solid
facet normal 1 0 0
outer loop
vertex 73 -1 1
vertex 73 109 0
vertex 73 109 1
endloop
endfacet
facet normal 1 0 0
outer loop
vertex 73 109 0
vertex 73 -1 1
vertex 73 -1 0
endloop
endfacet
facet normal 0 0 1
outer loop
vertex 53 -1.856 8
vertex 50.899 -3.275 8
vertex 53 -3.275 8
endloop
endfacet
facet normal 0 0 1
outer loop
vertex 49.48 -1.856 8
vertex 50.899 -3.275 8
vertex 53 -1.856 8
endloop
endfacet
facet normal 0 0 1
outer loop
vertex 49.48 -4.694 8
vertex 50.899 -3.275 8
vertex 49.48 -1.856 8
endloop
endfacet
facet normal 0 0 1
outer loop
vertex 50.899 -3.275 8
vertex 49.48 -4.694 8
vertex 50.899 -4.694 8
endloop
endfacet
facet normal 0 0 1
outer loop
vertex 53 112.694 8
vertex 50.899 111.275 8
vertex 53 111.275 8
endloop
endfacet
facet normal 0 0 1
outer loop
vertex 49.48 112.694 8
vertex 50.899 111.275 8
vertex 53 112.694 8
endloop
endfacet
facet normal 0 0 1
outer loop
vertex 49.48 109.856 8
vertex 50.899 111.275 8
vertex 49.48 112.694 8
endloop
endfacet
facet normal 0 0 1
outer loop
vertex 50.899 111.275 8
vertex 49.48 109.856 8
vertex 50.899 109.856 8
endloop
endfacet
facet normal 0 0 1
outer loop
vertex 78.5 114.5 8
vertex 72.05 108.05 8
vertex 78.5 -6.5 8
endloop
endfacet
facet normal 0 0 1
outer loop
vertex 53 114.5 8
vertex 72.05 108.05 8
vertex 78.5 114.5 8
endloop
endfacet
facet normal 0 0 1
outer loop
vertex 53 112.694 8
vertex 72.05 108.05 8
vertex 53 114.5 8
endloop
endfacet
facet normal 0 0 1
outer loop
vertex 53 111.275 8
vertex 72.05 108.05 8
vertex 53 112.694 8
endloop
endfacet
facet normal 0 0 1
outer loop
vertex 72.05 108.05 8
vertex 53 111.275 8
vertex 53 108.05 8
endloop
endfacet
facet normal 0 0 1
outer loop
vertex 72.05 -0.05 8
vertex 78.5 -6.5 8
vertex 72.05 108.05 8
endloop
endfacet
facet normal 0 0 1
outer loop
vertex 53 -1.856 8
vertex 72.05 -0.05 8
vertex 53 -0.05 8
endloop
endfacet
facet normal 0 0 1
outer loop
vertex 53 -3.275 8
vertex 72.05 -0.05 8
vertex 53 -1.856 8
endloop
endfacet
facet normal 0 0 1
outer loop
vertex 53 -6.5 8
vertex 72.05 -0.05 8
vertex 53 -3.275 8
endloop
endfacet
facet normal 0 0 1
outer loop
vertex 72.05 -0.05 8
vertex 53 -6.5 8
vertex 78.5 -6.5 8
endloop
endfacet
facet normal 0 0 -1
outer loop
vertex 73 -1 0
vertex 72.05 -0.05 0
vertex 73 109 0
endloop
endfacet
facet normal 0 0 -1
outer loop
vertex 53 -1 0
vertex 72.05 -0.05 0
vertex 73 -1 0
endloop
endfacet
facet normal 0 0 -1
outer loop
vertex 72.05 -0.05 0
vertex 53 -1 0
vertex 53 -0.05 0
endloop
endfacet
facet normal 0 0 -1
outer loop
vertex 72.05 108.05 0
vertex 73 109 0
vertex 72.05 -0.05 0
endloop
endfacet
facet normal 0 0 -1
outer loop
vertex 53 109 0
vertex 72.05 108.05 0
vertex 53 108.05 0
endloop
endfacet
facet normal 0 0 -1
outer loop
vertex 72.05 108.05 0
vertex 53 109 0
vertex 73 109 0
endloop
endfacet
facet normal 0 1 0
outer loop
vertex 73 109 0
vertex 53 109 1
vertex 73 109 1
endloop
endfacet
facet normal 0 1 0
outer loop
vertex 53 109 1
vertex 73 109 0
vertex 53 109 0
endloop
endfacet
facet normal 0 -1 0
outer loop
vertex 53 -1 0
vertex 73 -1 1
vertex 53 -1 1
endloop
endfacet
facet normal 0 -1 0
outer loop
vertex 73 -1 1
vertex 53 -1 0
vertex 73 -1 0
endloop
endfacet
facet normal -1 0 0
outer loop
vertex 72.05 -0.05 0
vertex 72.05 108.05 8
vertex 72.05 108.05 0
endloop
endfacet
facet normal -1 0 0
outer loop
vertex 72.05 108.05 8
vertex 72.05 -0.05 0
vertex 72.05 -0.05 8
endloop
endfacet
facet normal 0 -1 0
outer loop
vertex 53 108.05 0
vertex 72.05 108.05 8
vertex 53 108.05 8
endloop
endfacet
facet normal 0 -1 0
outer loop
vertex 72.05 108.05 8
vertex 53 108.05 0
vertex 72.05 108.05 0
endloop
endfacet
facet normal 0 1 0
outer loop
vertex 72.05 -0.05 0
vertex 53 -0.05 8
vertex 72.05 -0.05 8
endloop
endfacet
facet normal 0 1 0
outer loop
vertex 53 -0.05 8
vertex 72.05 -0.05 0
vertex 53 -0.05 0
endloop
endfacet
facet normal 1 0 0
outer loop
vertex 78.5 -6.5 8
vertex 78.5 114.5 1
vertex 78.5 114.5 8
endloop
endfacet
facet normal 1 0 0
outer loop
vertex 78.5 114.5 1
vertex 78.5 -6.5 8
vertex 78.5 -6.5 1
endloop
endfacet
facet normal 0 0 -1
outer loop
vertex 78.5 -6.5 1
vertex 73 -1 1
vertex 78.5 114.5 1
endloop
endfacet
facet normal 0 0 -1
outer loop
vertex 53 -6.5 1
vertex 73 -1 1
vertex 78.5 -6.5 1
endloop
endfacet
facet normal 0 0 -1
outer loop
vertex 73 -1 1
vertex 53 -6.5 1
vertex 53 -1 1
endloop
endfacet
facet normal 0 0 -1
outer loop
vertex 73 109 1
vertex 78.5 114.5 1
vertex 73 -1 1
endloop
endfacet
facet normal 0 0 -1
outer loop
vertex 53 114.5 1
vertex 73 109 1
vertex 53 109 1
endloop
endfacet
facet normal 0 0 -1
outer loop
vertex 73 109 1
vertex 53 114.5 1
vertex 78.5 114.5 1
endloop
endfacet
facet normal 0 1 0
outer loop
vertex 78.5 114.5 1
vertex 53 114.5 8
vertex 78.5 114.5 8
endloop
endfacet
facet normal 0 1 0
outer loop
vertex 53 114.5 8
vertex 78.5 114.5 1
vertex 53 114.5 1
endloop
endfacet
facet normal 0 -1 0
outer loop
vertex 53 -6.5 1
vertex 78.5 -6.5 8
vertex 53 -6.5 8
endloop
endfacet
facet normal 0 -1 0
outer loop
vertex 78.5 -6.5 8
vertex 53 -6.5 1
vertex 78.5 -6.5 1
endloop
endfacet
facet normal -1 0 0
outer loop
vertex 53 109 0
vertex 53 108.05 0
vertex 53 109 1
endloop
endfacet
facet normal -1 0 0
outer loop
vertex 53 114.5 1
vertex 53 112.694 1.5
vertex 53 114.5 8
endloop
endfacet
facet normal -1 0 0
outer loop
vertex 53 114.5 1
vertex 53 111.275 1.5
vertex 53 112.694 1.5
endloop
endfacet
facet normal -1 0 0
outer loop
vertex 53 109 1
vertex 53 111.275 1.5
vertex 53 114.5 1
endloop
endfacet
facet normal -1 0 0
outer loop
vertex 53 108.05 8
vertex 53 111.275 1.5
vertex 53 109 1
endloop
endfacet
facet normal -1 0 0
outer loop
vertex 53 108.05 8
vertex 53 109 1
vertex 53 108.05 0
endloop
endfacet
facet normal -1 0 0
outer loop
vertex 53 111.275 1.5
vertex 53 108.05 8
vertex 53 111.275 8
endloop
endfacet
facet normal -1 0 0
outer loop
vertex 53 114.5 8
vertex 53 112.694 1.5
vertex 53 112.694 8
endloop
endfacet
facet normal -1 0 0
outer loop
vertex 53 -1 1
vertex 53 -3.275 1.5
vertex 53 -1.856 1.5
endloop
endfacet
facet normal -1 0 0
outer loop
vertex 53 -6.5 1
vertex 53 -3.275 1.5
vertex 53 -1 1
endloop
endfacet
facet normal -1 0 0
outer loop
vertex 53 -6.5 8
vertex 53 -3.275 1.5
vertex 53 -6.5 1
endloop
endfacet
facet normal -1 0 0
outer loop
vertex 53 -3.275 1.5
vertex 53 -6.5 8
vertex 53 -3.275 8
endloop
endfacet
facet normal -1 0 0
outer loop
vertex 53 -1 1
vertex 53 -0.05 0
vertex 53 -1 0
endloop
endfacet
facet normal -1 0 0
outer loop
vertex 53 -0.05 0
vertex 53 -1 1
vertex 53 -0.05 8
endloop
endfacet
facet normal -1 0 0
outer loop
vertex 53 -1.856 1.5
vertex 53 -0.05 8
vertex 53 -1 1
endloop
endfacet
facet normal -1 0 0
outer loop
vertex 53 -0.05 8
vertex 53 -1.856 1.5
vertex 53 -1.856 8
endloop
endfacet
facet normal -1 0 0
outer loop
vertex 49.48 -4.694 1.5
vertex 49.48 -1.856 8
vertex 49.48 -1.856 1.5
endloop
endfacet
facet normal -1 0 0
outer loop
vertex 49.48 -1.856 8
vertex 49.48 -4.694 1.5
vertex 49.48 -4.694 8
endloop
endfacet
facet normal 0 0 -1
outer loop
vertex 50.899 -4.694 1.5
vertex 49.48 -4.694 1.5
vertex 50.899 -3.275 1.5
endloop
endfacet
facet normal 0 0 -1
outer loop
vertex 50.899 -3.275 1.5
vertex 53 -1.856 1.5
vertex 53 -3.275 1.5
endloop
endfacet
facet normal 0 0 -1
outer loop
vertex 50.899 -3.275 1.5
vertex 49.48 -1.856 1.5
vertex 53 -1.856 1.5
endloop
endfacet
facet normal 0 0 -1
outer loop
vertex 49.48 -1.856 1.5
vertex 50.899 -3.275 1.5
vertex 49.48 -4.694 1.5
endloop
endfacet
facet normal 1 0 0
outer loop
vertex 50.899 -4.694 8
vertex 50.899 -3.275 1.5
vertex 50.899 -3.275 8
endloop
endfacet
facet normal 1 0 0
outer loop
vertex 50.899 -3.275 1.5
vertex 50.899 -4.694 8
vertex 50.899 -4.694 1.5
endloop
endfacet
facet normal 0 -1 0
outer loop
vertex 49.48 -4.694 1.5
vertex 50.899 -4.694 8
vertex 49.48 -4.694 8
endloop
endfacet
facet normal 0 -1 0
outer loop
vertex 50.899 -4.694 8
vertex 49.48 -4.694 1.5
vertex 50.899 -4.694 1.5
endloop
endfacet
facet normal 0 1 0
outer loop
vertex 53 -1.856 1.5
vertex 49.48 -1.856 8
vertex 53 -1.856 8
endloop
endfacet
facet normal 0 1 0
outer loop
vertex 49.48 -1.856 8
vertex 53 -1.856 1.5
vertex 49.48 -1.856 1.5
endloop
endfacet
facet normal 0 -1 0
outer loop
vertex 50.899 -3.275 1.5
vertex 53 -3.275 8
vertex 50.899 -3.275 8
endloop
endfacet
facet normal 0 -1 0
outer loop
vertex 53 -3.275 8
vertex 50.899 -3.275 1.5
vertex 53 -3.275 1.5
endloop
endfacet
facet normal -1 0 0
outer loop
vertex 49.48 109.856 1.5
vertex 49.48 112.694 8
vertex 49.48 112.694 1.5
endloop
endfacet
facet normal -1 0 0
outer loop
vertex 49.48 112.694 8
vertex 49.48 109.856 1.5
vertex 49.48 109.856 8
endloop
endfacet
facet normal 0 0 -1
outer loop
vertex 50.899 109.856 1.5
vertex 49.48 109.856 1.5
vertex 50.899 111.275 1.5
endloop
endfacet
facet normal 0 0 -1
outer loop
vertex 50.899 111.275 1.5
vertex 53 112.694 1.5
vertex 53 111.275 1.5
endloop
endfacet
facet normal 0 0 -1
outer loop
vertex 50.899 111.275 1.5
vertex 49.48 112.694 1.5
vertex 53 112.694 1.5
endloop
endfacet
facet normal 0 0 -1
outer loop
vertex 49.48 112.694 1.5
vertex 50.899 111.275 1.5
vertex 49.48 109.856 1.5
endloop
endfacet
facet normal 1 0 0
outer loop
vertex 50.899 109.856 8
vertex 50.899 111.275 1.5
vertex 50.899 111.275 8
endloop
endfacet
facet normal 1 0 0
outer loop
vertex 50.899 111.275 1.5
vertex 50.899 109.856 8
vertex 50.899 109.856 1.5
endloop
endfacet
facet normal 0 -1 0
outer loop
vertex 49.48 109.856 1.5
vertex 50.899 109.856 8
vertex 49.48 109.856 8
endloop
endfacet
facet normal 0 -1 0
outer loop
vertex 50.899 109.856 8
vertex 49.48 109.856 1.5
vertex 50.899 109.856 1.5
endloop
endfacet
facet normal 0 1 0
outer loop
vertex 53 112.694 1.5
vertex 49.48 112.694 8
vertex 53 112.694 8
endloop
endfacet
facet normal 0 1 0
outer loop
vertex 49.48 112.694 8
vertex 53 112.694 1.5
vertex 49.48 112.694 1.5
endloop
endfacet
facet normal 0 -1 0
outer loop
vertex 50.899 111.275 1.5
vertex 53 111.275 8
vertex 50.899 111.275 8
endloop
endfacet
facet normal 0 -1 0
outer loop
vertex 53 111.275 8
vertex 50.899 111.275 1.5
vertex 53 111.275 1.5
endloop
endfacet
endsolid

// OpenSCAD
// Generated by SolidPython 1.0.4 on 2021-01-19 17:41:30


union() {
	union() {
		difference() {
			union() {
				difference() {
					translate(v = [-1.0000000000, -1.0000000000, 0]) {
						cube(size = [74.0000000000, 110.0000000000, 8]);
					}
					translate(v = [-0.0500000000, -0.0500000000, 0]) {
						cube(size = [72.1000000000, 108.1000000000, 8]);
					}
				}
				translate(v = [0, 0, 1]) {
					difference() {
						translate(v = [-6.5000000000, -6.5000000000, 0]) {
							cube(size = [85.0000000000, 121.0000000000, 7]);
						}
						translate(v = [-1.0000000000, -1.0000000000, 0]) {
							cube(size = [74.0000000000, 110.0000000000, 7]);
						}
					}
				}
			}
			translate(v = [-6.5000000000, -6.5000000000, 0]) {
				cube(size = [59.5000000000, 121.0000000000, 8]);
			}
		}
		translate(v = [49.0000000000, -4.6940000000, 0]) {
			translate(v = [0.4800000000, 0, 1.5000000000]) {
				scale(v = [0.8800000000, 0.8800000000, 1]) {
					translate(v = [4, 3.2250000000, 0]) {
						rotate(a = -180) {
							union() {
								translate(v = [2.3875000000, 0, 0]) {
									cube(size = [1.6125000000, 3.2250000000, 6.5000000000]);
								}
								cube(size = [4, 1.6125000000, 6.5000000000]);
							}
						}
					}
				}
			}
		}
	}
	translate(v = [49.0000000000, 109.8560000000, 0]) {
		translate(v = [0.4800000000, 0, 1.5000000000]) {
			scale(v = [0.8800000000, 0.8800000000, 1]) {
				translate(v = [4, 3.2250000000, 0]) {
					rotate(a = -180) {
						union() {
							translate(v = [2.3875000000, 0, 0]) {
								cube(size = [1.6125000000, 3.2250000000, 6.5000000000]);
							}
							cube(size = [4, 1.6125000000, 6.5000000000]);
						}
					}
				}
			}
		}
	}
}
